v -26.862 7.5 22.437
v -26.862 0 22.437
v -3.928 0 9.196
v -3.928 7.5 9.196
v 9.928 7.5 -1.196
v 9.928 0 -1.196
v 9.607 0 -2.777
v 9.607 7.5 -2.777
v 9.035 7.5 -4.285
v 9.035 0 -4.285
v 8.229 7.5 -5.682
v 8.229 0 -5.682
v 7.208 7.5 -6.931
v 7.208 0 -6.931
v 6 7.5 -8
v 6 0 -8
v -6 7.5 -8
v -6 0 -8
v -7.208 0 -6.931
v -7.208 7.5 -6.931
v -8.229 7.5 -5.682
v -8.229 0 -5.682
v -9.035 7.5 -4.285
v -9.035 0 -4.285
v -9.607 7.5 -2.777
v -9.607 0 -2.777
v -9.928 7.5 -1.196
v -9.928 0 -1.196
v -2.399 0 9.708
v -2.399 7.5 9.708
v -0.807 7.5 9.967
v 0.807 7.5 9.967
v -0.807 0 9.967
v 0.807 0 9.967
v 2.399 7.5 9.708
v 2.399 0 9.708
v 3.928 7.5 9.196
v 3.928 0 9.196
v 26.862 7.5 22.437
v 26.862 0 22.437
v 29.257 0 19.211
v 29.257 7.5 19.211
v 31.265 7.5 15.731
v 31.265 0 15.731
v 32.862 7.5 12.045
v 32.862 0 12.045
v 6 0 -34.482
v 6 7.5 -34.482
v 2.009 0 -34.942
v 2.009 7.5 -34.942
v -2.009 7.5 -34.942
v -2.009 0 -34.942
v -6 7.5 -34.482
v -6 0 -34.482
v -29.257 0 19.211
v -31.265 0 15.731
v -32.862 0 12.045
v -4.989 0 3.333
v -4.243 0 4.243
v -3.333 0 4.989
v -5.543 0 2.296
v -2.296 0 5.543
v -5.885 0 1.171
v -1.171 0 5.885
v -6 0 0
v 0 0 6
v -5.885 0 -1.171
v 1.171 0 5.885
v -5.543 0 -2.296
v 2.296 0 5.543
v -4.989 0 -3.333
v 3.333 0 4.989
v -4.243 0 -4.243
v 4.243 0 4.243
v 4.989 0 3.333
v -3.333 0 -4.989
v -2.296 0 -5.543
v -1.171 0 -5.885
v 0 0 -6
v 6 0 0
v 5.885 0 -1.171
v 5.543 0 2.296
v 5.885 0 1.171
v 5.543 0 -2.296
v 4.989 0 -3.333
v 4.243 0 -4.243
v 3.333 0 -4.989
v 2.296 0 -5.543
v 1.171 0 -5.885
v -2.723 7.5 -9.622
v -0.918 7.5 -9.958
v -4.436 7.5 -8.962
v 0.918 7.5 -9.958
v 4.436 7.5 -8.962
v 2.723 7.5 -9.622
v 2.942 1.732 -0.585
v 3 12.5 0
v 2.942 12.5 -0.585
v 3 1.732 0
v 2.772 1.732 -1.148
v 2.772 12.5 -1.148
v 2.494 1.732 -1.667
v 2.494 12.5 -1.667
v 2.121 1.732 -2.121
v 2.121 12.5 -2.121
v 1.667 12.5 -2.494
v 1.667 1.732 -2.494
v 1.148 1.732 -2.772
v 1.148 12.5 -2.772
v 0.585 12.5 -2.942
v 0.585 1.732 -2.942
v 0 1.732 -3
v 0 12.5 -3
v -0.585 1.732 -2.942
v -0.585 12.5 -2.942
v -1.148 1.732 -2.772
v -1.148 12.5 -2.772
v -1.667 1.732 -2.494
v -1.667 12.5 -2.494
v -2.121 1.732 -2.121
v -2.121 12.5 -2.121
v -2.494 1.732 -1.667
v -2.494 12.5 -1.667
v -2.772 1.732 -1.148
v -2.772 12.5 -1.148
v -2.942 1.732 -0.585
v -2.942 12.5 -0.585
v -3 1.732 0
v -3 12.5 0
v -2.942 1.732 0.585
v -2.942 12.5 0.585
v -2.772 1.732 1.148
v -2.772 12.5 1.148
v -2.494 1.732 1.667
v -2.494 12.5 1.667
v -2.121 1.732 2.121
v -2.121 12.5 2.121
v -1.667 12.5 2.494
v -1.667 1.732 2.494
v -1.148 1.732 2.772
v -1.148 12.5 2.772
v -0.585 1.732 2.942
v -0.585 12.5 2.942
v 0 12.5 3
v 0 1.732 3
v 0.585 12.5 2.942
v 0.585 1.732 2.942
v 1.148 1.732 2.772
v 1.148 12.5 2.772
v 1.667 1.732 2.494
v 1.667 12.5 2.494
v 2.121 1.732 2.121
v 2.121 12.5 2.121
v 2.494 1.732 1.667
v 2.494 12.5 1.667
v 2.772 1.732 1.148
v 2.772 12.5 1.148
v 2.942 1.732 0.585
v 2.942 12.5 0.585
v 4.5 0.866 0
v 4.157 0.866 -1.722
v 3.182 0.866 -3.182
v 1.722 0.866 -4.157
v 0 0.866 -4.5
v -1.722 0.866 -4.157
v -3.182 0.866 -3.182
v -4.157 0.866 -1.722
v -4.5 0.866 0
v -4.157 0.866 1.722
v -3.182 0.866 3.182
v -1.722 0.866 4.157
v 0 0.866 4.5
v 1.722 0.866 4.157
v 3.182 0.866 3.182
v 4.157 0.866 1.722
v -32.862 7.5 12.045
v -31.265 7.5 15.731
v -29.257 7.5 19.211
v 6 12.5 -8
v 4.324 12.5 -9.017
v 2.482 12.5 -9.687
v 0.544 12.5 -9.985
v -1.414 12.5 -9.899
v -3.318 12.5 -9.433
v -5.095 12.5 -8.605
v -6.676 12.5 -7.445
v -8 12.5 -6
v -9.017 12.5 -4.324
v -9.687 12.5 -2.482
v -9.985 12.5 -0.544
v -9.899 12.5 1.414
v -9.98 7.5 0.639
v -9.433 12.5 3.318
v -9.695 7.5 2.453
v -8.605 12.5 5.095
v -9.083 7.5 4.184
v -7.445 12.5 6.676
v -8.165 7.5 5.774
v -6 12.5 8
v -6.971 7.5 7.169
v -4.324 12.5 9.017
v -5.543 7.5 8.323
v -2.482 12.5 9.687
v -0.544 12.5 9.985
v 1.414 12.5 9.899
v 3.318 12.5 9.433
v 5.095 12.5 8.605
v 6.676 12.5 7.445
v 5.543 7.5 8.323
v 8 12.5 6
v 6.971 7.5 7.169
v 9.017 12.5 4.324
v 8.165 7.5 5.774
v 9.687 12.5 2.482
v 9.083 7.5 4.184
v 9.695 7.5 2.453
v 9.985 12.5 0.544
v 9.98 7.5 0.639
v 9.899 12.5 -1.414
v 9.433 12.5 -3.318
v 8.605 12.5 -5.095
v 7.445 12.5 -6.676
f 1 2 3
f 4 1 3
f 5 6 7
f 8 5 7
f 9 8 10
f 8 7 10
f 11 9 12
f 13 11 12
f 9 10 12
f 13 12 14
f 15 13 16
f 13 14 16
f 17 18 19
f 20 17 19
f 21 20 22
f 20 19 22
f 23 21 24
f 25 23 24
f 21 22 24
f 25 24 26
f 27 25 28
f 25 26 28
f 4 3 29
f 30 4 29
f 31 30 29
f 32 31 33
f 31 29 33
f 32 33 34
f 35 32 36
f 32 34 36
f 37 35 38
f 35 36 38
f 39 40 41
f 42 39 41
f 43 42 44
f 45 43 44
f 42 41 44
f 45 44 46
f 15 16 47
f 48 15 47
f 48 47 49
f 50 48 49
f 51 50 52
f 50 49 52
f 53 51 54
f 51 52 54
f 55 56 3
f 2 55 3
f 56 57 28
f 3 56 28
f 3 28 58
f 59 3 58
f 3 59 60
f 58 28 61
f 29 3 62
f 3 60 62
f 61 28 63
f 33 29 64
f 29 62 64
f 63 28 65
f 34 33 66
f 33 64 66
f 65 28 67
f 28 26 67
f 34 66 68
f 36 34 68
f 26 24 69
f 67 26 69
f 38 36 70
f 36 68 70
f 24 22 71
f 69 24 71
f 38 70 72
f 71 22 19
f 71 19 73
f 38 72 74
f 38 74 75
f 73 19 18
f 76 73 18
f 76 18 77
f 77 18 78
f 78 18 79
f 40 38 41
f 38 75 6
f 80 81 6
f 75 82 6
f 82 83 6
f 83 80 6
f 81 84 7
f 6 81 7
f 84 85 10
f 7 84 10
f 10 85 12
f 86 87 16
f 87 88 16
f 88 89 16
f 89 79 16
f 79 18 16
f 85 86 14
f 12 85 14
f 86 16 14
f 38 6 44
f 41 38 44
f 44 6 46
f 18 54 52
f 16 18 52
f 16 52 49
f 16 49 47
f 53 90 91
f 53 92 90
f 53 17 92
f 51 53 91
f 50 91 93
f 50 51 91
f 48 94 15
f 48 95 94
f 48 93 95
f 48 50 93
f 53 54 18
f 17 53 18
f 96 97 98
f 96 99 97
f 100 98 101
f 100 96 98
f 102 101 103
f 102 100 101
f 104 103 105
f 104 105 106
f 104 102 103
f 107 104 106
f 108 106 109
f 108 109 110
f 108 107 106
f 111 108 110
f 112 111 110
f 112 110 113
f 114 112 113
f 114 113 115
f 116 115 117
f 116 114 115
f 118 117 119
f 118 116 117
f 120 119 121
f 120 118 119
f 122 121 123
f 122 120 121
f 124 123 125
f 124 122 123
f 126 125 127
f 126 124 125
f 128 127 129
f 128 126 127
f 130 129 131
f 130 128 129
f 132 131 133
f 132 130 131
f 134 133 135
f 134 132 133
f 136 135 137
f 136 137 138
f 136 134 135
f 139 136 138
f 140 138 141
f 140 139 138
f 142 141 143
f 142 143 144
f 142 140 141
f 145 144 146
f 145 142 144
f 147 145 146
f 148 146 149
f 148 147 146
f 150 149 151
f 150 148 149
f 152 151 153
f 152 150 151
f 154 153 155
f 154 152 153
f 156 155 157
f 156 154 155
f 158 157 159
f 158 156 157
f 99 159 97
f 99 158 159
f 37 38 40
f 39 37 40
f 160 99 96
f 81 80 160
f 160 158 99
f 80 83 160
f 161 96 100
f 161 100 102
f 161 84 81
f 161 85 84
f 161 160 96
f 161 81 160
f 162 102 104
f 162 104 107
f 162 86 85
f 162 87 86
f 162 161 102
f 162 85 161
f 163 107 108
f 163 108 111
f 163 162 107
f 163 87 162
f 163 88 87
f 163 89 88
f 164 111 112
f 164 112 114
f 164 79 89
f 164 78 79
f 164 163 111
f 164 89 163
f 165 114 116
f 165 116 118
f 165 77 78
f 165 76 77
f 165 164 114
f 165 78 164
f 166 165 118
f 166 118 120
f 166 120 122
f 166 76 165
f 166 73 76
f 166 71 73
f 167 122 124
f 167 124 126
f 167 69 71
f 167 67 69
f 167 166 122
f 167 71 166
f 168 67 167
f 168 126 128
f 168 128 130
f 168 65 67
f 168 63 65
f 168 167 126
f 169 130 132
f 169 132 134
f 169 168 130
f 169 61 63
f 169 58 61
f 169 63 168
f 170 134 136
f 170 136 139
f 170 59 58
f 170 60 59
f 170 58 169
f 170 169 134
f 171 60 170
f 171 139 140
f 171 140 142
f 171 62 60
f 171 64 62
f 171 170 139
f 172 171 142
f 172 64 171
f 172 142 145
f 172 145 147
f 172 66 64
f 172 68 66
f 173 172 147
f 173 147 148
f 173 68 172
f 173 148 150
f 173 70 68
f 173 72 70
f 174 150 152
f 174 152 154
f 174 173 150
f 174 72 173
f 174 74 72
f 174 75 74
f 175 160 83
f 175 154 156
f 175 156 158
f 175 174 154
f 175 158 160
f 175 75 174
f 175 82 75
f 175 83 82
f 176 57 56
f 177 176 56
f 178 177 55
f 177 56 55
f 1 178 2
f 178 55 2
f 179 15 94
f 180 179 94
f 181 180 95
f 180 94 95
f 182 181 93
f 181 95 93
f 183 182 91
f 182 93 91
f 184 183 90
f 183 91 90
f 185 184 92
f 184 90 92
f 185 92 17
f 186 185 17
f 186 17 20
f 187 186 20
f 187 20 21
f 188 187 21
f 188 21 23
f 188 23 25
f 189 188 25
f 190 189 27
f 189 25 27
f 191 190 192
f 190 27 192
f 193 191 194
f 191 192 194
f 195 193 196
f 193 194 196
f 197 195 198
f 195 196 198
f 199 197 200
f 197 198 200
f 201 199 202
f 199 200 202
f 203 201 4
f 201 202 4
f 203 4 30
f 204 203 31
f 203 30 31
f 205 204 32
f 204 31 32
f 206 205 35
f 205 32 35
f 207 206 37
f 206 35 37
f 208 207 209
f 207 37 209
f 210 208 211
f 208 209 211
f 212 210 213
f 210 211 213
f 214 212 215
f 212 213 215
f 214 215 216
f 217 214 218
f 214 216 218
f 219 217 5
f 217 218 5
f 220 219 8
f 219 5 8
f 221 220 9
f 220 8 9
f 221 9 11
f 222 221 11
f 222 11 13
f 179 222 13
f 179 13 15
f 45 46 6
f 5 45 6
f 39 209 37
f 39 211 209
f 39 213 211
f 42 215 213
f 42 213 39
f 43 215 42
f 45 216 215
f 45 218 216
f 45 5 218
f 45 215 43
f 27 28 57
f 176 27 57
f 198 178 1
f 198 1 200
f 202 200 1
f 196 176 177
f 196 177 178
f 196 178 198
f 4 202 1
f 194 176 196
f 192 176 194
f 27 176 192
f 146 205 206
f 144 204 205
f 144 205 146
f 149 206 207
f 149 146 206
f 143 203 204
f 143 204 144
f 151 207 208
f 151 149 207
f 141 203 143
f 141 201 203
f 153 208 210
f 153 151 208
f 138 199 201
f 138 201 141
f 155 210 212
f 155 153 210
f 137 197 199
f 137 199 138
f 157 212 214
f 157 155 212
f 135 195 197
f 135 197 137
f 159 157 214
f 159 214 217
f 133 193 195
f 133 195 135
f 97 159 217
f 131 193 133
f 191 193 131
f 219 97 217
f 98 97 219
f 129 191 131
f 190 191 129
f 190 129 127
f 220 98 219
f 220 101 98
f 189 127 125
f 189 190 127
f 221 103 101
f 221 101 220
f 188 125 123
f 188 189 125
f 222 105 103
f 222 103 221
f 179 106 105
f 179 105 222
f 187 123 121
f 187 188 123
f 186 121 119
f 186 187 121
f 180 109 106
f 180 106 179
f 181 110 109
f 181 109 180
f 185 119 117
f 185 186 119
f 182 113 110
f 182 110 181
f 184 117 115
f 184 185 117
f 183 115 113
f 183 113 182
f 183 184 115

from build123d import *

# Parameters (mm, degrees)
BOSS_EXTRUDE1_DEPTH = 7.5
SKETCH2_R           = 10
BOSS_EXTRUDE2_DEPTH = 5


with BuildPart() as part:
    # Sketch1 → Boss-Extrude1 (new body)
    with BuildSketch(Plane(origin=(0, 0, 0), x_dir=(1, 0, 0), z_dir=(0, 1, 0))):
        with BuildLine():
            Line((-6, 34.481879299), (-6, 8))
            ThreePointArc((-6, 8), (-8.660254038, 5), (-9.92820323, 1.196152423))
            Line((-9.92820323, 1.196152423), (-32.862183443, -12.044787227))
            ThreePointArc((-32.862183443, -12.044787227), (-30.310889132, -17.5), (-26.862183443, -22.437092072))
            Line((-26.862183443, -22.437092072), (-3.92820323, -9.196152423))
            ThreePointArc((-3.92820323, -9.196152423), (0, -10), (3.92820323, -9.196152423))
            Line((3.92820323, -9.196152423), (26.862183443, -22.437092072))
            ThreePointArc((26.862183443, -22.437092072), (30.310889132, -17.5), (32.862183443, -12.044787227))
            Line((32.862183443, -12.044787227), (9.92820323, 1.196152423))
            ThreePointArc((9.92820323, 1.196152423), (8.660254038, 5), (6, 8))
            Line((6, 8), (6, 34.481879299))
            ThreePointArc((6, 34.481879299), (0, 35), (-6, 34.481879299))
        make_face()
    extrude(amount=BOSS_EXTRUDE1_DEPTH)

    # Sketch2 → Boss-Extrude2 (add)
    with BuildSketch(Plane(origin=(0, 7.5, 0), x_dir=(1, 0, 0), z_dir=(0, 1, 0))):
        with Locations(Location((0, 0, 0), (0, 0, 53.130102354))):
            Circle(SKETCH2_R)
    extrude(amount=BOSS_EXTRUDE2_DEPTH)

    # Sketch3 → Cut-Revolve1 (revolve, cut)
    with BuildSketch(Plane.XY):
        Polygon((0, 0), (0, 12.5), (3, 12.5), (3, 1.732050808), (6, 0), align=None)
    revolve(axis=Axis((0, 0, 0), (0, 1, 0)), mode=Mode.SUBTRACT)


solid = part.part
